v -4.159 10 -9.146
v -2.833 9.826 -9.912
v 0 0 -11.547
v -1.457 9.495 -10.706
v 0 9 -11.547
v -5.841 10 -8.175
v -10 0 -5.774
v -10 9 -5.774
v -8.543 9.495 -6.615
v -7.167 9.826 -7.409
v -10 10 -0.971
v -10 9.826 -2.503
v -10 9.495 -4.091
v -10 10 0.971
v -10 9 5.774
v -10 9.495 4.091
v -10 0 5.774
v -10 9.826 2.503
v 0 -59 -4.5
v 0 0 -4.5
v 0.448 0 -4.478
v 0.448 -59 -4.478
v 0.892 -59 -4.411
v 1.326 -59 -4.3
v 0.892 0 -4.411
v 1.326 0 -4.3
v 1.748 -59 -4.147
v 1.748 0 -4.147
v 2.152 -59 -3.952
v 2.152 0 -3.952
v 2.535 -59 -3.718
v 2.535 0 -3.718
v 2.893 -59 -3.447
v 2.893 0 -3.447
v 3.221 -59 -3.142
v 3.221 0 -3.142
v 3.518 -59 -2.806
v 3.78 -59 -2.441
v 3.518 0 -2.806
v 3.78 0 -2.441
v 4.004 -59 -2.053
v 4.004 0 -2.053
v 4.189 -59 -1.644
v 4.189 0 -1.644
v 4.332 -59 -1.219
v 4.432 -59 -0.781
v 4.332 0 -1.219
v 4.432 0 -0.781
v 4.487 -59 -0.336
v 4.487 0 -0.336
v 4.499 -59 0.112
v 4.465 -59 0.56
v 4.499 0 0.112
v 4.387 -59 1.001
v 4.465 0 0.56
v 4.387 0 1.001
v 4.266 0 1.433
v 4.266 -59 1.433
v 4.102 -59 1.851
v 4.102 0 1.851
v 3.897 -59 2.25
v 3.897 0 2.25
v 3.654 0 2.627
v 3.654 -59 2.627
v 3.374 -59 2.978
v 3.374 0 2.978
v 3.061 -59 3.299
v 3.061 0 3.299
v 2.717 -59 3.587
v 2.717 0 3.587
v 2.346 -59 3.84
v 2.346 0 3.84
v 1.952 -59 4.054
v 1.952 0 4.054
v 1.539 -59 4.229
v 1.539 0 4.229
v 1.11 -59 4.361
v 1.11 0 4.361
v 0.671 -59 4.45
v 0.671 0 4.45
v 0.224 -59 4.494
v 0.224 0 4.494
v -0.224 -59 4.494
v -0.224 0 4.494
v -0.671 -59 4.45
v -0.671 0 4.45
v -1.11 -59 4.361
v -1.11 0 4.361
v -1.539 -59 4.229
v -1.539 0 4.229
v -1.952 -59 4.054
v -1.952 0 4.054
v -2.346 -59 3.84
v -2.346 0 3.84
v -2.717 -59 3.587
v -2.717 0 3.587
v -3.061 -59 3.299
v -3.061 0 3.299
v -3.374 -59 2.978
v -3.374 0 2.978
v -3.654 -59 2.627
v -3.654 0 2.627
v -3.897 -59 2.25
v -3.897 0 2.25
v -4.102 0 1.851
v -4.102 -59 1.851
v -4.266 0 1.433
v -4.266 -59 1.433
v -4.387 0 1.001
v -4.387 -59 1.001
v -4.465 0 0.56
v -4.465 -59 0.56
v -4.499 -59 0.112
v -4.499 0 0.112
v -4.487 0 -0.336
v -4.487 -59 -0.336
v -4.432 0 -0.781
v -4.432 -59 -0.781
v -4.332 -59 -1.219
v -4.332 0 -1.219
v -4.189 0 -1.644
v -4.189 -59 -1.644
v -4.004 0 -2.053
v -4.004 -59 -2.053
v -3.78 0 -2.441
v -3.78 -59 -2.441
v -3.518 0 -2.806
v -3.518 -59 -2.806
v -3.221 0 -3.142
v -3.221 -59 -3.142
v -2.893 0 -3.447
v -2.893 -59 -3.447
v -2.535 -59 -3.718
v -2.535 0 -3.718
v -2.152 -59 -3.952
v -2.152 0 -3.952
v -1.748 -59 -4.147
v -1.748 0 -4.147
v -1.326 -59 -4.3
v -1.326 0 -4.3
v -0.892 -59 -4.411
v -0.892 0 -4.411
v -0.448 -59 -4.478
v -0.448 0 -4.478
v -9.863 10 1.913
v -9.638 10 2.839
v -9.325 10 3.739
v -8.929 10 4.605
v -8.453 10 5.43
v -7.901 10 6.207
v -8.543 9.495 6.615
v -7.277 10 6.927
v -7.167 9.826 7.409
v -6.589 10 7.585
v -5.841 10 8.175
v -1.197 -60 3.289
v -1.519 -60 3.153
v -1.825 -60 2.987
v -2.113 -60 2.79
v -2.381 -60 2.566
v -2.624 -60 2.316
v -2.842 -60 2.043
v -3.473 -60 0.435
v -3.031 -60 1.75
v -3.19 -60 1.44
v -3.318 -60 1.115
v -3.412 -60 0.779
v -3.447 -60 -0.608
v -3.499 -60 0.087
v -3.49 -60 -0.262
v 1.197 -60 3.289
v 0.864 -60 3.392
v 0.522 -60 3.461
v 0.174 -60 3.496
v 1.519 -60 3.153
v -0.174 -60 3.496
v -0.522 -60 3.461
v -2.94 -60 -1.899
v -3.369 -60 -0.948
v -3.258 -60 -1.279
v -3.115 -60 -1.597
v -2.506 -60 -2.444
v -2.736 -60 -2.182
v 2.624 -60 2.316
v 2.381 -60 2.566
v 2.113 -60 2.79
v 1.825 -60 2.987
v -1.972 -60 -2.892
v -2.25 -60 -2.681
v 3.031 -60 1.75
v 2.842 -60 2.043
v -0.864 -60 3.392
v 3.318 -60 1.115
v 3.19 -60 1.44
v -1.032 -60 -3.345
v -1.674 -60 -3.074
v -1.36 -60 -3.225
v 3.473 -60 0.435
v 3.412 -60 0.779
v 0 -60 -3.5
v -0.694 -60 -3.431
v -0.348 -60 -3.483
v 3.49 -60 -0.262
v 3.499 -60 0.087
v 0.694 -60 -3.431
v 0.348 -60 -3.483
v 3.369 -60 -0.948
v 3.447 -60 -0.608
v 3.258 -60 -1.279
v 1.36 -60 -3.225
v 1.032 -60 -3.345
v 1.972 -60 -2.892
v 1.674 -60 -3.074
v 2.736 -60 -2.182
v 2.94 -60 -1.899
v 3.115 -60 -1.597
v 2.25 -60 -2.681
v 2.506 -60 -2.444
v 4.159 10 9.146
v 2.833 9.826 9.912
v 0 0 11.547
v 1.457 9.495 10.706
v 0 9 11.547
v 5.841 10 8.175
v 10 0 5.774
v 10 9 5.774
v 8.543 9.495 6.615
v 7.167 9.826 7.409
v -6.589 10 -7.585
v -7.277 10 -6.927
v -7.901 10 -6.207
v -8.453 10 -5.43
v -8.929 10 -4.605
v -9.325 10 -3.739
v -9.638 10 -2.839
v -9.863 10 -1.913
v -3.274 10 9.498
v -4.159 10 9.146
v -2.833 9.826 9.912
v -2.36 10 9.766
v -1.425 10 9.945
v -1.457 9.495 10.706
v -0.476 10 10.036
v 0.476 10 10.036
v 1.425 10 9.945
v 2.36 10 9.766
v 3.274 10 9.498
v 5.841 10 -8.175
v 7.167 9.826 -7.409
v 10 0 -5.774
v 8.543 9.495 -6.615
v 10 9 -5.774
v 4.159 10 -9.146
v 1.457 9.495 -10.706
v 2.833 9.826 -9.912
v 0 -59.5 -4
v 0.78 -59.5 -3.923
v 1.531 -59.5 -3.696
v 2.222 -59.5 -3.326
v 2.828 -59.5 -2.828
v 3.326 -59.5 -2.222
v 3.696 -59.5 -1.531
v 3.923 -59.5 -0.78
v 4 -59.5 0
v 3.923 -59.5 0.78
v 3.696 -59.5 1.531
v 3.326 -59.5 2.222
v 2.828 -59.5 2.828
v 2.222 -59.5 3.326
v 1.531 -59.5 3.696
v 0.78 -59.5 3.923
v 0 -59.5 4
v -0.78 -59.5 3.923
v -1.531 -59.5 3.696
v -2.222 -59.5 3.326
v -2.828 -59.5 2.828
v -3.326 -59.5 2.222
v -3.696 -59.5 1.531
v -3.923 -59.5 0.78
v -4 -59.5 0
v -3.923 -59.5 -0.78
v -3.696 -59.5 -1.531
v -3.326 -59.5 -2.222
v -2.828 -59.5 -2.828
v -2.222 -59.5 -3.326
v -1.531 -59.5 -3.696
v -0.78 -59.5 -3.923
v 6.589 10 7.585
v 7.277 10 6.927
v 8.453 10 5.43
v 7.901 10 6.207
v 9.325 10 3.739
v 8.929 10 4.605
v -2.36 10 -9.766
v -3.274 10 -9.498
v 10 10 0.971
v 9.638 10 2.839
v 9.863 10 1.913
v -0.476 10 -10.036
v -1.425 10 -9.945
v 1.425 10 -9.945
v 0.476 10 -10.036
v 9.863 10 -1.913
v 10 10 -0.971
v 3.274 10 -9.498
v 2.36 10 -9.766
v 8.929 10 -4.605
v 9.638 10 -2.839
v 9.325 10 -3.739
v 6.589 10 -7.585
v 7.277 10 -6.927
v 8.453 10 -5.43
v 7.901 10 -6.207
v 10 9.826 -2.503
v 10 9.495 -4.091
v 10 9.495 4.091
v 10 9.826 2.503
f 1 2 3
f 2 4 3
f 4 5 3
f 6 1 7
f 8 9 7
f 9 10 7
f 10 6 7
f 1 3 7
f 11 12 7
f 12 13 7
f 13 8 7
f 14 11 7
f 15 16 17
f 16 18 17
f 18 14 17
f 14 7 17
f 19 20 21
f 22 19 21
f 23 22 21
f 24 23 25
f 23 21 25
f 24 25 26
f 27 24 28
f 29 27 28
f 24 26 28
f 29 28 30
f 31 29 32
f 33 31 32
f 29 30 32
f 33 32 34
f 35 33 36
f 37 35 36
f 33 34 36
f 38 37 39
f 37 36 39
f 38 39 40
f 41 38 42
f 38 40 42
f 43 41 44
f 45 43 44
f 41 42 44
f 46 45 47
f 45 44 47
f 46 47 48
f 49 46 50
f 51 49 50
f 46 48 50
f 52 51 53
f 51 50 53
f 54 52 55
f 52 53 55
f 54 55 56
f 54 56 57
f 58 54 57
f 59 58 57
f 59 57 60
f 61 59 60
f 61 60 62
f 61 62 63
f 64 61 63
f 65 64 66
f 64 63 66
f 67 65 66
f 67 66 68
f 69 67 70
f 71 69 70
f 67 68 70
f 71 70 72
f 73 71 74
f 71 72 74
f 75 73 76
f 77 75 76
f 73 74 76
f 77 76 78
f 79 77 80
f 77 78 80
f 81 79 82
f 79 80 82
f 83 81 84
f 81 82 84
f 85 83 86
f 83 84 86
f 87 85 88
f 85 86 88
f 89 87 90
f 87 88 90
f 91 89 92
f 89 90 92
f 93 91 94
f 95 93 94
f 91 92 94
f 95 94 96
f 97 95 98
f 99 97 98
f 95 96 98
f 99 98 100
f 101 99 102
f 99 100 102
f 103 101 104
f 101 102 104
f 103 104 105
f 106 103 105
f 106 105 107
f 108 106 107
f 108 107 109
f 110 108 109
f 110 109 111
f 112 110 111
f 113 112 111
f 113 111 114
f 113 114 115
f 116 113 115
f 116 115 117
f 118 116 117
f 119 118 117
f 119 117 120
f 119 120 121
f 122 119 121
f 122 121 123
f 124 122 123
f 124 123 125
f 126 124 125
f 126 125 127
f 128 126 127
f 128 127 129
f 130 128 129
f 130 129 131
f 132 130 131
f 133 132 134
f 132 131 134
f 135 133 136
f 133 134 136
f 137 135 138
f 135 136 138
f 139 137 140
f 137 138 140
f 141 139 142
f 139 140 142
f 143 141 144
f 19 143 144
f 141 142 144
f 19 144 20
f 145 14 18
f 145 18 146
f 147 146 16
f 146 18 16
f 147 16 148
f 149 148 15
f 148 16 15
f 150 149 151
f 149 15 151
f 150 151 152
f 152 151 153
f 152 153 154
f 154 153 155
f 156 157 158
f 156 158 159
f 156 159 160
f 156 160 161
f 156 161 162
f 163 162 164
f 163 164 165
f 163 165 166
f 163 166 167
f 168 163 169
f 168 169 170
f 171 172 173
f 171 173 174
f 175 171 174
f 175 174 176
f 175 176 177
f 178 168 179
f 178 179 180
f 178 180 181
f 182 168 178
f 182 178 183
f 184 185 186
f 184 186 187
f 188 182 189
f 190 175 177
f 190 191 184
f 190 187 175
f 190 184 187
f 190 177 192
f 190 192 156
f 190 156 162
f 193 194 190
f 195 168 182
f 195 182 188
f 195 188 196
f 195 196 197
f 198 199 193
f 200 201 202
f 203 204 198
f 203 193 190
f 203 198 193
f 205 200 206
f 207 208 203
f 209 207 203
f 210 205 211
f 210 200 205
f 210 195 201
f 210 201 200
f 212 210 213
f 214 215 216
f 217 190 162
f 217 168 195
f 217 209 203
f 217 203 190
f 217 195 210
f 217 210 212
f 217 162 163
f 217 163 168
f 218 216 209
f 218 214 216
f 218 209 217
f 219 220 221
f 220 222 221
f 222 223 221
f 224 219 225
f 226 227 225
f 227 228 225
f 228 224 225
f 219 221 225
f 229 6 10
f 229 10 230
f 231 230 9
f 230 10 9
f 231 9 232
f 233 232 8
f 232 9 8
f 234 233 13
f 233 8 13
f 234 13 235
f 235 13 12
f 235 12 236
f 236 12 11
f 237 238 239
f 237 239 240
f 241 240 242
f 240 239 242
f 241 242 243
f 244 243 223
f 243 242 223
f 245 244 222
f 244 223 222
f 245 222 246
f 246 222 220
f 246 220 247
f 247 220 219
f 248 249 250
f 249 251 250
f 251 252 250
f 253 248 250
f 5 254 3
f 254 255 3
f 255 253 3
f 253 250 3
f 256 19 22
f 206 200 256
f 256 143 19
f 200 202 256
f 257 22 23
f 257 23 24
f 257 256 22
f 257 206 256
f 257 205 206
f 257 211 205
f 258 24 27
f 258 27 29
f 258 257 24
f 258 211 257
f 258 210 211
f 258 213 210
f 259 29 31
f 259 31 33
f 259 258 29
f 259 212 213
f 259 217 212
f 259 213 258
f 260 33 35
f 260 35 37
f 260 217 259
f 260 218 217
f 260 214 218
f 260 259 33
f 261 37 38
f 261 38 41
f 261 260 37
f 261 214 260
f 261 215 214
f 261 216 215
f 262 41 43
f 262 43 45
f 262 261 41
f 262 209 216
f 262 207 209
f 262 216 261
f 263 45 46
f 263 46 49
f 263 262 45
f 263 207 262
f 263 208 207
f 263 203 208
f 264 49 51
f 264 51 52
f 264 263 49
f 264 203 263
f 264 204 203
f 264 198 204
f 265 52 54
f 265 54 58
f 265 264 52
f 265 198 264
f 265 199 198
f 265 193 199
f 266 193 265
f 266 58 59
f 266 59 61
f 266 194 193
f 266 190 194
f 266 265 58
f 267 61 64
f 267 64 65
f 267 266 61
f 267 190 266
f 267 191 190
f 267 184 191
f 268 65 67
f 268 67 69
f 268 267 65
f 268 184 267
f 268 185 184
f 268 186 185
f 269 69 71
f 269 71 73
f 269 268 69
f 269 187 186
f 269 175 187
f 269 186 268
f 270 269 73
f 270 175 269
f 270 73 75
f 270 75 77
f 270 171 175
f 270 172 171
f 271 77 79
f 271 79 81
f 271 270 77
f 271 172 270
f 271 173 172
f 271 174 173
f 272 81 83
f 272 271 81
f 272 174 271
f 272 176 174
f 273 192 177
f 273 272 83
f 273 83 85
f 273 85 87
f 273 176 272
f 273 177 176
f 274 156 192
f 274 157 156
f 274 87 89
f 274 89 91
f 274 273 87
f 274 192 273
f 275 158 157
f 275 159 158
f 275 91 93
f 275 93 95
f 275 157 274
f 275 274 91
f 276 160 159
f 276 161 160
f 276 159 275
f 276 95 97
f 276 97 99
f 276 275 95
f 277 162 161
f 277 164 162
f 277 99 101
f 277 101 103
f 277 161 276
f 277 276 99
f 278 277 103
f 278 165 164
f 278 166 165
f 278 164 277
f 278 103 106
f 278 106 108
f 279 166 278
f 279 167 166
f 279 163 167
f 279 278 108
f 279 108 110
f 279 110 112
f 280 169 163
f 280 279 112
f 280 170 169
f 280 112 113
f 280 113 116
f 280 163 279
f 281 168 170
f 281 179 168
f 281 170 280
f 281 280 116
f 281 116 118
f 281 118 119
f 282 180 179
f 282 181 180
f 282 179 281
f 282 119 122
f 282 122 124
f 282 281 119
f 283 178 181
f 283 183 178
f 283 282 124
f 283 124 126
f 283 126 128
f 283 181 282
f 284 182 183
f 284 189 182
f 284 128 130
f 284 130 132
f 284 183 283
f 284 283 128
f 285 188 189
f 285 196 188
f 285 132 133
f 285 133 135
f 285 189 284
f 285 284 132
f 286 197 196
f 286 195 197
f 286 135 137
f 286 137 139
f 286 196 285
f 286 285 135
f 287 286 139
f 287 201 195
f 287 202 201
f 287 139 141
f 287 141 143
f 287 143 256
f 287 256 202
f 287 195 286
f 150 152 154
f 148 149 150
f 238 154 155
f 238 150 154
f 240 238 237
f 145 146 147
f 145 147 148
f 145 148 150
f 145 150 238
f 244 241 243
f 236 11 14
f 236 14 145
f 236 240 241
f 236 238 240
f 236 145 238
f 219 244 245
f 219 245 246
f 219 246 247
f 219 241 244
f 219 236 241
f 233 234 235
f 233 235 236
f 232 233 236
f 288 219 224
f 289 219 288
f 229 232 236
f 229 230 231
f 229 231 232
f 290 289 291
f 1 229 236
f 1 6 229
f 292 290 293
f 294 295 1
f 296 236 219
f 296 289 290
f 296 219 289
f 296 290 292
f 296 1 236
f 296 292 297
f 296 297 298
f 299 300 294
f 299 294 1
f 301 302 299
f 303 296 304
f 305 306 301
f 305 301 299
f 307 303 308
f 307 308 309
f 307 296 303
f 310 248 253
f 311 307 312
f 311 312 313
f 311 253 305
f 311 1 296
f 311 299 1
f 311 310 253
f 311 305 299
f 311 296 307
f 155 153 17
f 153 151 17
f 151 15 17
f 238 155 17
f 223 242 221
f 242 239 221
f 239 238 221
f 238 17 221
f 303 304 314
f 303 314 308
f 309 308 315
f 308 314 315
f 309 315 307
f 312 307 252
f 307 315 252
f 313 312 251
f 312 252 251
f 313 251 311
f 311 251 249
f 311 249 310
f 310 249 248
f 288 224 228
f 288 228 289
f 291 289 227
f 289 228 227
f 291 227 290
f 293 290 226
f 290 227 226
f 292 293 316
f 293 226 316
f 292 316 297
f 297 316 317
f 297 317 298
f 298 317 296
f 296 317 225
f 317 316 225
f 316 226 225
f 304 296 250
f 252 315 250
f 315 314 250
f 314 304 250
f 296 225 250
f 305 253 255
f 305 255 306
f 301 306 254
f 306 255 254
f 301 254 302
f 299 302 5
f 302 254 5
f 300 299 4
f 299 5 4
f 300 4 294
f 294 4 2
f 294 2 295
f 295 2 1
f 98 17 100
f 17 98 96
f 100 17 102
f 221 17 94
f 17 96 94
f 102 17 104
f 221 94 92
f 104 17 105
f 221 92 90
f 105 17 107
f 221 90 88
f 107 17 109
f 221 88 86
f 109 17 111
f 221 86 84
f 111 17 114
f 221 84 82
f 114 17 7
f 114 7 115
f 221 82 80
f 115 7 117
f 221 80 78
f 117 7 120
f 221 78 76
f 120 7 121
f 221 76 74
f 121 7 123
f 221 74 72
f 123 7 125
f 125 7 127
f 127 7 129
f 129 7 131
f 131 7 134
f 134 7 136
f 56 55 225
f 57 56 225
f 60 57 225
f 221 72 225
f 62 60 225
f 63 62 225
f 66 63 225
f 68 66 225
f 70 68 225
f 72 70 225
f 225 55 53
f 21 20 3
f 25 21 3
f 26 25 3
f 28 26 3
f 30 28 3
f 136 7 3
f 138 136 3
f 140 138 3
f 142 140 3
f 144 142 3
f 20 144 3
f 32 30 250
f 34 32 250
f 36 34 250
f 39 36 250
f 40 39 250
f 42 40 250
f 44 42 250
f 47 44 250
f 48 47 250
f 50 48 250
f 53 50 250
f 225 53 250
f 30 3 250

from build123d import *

# Parameters (mm, degrees)
BOSS_EXTRUDE1_DEPTH = 10
SKETCH3_R           = 4.5
BOSS_EXTRUDE2_DEPTH = 60
CHAMFER1_SIZE       = 1


with BuildPart() as part:
    # Sketch1 → Boss-Extrude1 (new body)
    with BuildSketch(Plane(origin=(0, 0, 0), x_dir=(1, 0, 0), z_dir=(0, 1, 0))):
        Polygon((10, 5.773502692), (0, 11.547005384), (-10, 5.773502692), (-10, -5.773502692), (0, -11.547005384), (10, -5.773502692), align=None)
    extrude(amount=BOSS_EXTRUDE1_DEPTH)

    # Sketch2 → Cut-Revolve1 (revolve, cut)
    with BuildSketch(Plane(origin=(0, 0, 0), x_dir=(0, 0, -1), z_dir=(1, 0, 0))):
        Polygon((-11.547005384, 10), (-10.047005384, 10), (-11.547005384, 9), align=None)
    revolve(axis=Axis((0, 0, 0), (0, 1, 0)), mode=Mode.SUBTRACT)

    # Sketch3 → Boss-Extrude2 (add)
    with BuildSketch(Plane.XZ):
        Circle(SKETCH3_R)
    extrude(amount=BOSS_EXTRUDE2_DEPTH)

    # Chamfer1
    chamfer1_edges = [part.edges().sort_by_distance(p)[0] for p in [
        (-4.5, -60, 0),
    ]]
    chamfer(chamfer1_edges, length=CHAMFER1_SIZE)


solid = part.part
